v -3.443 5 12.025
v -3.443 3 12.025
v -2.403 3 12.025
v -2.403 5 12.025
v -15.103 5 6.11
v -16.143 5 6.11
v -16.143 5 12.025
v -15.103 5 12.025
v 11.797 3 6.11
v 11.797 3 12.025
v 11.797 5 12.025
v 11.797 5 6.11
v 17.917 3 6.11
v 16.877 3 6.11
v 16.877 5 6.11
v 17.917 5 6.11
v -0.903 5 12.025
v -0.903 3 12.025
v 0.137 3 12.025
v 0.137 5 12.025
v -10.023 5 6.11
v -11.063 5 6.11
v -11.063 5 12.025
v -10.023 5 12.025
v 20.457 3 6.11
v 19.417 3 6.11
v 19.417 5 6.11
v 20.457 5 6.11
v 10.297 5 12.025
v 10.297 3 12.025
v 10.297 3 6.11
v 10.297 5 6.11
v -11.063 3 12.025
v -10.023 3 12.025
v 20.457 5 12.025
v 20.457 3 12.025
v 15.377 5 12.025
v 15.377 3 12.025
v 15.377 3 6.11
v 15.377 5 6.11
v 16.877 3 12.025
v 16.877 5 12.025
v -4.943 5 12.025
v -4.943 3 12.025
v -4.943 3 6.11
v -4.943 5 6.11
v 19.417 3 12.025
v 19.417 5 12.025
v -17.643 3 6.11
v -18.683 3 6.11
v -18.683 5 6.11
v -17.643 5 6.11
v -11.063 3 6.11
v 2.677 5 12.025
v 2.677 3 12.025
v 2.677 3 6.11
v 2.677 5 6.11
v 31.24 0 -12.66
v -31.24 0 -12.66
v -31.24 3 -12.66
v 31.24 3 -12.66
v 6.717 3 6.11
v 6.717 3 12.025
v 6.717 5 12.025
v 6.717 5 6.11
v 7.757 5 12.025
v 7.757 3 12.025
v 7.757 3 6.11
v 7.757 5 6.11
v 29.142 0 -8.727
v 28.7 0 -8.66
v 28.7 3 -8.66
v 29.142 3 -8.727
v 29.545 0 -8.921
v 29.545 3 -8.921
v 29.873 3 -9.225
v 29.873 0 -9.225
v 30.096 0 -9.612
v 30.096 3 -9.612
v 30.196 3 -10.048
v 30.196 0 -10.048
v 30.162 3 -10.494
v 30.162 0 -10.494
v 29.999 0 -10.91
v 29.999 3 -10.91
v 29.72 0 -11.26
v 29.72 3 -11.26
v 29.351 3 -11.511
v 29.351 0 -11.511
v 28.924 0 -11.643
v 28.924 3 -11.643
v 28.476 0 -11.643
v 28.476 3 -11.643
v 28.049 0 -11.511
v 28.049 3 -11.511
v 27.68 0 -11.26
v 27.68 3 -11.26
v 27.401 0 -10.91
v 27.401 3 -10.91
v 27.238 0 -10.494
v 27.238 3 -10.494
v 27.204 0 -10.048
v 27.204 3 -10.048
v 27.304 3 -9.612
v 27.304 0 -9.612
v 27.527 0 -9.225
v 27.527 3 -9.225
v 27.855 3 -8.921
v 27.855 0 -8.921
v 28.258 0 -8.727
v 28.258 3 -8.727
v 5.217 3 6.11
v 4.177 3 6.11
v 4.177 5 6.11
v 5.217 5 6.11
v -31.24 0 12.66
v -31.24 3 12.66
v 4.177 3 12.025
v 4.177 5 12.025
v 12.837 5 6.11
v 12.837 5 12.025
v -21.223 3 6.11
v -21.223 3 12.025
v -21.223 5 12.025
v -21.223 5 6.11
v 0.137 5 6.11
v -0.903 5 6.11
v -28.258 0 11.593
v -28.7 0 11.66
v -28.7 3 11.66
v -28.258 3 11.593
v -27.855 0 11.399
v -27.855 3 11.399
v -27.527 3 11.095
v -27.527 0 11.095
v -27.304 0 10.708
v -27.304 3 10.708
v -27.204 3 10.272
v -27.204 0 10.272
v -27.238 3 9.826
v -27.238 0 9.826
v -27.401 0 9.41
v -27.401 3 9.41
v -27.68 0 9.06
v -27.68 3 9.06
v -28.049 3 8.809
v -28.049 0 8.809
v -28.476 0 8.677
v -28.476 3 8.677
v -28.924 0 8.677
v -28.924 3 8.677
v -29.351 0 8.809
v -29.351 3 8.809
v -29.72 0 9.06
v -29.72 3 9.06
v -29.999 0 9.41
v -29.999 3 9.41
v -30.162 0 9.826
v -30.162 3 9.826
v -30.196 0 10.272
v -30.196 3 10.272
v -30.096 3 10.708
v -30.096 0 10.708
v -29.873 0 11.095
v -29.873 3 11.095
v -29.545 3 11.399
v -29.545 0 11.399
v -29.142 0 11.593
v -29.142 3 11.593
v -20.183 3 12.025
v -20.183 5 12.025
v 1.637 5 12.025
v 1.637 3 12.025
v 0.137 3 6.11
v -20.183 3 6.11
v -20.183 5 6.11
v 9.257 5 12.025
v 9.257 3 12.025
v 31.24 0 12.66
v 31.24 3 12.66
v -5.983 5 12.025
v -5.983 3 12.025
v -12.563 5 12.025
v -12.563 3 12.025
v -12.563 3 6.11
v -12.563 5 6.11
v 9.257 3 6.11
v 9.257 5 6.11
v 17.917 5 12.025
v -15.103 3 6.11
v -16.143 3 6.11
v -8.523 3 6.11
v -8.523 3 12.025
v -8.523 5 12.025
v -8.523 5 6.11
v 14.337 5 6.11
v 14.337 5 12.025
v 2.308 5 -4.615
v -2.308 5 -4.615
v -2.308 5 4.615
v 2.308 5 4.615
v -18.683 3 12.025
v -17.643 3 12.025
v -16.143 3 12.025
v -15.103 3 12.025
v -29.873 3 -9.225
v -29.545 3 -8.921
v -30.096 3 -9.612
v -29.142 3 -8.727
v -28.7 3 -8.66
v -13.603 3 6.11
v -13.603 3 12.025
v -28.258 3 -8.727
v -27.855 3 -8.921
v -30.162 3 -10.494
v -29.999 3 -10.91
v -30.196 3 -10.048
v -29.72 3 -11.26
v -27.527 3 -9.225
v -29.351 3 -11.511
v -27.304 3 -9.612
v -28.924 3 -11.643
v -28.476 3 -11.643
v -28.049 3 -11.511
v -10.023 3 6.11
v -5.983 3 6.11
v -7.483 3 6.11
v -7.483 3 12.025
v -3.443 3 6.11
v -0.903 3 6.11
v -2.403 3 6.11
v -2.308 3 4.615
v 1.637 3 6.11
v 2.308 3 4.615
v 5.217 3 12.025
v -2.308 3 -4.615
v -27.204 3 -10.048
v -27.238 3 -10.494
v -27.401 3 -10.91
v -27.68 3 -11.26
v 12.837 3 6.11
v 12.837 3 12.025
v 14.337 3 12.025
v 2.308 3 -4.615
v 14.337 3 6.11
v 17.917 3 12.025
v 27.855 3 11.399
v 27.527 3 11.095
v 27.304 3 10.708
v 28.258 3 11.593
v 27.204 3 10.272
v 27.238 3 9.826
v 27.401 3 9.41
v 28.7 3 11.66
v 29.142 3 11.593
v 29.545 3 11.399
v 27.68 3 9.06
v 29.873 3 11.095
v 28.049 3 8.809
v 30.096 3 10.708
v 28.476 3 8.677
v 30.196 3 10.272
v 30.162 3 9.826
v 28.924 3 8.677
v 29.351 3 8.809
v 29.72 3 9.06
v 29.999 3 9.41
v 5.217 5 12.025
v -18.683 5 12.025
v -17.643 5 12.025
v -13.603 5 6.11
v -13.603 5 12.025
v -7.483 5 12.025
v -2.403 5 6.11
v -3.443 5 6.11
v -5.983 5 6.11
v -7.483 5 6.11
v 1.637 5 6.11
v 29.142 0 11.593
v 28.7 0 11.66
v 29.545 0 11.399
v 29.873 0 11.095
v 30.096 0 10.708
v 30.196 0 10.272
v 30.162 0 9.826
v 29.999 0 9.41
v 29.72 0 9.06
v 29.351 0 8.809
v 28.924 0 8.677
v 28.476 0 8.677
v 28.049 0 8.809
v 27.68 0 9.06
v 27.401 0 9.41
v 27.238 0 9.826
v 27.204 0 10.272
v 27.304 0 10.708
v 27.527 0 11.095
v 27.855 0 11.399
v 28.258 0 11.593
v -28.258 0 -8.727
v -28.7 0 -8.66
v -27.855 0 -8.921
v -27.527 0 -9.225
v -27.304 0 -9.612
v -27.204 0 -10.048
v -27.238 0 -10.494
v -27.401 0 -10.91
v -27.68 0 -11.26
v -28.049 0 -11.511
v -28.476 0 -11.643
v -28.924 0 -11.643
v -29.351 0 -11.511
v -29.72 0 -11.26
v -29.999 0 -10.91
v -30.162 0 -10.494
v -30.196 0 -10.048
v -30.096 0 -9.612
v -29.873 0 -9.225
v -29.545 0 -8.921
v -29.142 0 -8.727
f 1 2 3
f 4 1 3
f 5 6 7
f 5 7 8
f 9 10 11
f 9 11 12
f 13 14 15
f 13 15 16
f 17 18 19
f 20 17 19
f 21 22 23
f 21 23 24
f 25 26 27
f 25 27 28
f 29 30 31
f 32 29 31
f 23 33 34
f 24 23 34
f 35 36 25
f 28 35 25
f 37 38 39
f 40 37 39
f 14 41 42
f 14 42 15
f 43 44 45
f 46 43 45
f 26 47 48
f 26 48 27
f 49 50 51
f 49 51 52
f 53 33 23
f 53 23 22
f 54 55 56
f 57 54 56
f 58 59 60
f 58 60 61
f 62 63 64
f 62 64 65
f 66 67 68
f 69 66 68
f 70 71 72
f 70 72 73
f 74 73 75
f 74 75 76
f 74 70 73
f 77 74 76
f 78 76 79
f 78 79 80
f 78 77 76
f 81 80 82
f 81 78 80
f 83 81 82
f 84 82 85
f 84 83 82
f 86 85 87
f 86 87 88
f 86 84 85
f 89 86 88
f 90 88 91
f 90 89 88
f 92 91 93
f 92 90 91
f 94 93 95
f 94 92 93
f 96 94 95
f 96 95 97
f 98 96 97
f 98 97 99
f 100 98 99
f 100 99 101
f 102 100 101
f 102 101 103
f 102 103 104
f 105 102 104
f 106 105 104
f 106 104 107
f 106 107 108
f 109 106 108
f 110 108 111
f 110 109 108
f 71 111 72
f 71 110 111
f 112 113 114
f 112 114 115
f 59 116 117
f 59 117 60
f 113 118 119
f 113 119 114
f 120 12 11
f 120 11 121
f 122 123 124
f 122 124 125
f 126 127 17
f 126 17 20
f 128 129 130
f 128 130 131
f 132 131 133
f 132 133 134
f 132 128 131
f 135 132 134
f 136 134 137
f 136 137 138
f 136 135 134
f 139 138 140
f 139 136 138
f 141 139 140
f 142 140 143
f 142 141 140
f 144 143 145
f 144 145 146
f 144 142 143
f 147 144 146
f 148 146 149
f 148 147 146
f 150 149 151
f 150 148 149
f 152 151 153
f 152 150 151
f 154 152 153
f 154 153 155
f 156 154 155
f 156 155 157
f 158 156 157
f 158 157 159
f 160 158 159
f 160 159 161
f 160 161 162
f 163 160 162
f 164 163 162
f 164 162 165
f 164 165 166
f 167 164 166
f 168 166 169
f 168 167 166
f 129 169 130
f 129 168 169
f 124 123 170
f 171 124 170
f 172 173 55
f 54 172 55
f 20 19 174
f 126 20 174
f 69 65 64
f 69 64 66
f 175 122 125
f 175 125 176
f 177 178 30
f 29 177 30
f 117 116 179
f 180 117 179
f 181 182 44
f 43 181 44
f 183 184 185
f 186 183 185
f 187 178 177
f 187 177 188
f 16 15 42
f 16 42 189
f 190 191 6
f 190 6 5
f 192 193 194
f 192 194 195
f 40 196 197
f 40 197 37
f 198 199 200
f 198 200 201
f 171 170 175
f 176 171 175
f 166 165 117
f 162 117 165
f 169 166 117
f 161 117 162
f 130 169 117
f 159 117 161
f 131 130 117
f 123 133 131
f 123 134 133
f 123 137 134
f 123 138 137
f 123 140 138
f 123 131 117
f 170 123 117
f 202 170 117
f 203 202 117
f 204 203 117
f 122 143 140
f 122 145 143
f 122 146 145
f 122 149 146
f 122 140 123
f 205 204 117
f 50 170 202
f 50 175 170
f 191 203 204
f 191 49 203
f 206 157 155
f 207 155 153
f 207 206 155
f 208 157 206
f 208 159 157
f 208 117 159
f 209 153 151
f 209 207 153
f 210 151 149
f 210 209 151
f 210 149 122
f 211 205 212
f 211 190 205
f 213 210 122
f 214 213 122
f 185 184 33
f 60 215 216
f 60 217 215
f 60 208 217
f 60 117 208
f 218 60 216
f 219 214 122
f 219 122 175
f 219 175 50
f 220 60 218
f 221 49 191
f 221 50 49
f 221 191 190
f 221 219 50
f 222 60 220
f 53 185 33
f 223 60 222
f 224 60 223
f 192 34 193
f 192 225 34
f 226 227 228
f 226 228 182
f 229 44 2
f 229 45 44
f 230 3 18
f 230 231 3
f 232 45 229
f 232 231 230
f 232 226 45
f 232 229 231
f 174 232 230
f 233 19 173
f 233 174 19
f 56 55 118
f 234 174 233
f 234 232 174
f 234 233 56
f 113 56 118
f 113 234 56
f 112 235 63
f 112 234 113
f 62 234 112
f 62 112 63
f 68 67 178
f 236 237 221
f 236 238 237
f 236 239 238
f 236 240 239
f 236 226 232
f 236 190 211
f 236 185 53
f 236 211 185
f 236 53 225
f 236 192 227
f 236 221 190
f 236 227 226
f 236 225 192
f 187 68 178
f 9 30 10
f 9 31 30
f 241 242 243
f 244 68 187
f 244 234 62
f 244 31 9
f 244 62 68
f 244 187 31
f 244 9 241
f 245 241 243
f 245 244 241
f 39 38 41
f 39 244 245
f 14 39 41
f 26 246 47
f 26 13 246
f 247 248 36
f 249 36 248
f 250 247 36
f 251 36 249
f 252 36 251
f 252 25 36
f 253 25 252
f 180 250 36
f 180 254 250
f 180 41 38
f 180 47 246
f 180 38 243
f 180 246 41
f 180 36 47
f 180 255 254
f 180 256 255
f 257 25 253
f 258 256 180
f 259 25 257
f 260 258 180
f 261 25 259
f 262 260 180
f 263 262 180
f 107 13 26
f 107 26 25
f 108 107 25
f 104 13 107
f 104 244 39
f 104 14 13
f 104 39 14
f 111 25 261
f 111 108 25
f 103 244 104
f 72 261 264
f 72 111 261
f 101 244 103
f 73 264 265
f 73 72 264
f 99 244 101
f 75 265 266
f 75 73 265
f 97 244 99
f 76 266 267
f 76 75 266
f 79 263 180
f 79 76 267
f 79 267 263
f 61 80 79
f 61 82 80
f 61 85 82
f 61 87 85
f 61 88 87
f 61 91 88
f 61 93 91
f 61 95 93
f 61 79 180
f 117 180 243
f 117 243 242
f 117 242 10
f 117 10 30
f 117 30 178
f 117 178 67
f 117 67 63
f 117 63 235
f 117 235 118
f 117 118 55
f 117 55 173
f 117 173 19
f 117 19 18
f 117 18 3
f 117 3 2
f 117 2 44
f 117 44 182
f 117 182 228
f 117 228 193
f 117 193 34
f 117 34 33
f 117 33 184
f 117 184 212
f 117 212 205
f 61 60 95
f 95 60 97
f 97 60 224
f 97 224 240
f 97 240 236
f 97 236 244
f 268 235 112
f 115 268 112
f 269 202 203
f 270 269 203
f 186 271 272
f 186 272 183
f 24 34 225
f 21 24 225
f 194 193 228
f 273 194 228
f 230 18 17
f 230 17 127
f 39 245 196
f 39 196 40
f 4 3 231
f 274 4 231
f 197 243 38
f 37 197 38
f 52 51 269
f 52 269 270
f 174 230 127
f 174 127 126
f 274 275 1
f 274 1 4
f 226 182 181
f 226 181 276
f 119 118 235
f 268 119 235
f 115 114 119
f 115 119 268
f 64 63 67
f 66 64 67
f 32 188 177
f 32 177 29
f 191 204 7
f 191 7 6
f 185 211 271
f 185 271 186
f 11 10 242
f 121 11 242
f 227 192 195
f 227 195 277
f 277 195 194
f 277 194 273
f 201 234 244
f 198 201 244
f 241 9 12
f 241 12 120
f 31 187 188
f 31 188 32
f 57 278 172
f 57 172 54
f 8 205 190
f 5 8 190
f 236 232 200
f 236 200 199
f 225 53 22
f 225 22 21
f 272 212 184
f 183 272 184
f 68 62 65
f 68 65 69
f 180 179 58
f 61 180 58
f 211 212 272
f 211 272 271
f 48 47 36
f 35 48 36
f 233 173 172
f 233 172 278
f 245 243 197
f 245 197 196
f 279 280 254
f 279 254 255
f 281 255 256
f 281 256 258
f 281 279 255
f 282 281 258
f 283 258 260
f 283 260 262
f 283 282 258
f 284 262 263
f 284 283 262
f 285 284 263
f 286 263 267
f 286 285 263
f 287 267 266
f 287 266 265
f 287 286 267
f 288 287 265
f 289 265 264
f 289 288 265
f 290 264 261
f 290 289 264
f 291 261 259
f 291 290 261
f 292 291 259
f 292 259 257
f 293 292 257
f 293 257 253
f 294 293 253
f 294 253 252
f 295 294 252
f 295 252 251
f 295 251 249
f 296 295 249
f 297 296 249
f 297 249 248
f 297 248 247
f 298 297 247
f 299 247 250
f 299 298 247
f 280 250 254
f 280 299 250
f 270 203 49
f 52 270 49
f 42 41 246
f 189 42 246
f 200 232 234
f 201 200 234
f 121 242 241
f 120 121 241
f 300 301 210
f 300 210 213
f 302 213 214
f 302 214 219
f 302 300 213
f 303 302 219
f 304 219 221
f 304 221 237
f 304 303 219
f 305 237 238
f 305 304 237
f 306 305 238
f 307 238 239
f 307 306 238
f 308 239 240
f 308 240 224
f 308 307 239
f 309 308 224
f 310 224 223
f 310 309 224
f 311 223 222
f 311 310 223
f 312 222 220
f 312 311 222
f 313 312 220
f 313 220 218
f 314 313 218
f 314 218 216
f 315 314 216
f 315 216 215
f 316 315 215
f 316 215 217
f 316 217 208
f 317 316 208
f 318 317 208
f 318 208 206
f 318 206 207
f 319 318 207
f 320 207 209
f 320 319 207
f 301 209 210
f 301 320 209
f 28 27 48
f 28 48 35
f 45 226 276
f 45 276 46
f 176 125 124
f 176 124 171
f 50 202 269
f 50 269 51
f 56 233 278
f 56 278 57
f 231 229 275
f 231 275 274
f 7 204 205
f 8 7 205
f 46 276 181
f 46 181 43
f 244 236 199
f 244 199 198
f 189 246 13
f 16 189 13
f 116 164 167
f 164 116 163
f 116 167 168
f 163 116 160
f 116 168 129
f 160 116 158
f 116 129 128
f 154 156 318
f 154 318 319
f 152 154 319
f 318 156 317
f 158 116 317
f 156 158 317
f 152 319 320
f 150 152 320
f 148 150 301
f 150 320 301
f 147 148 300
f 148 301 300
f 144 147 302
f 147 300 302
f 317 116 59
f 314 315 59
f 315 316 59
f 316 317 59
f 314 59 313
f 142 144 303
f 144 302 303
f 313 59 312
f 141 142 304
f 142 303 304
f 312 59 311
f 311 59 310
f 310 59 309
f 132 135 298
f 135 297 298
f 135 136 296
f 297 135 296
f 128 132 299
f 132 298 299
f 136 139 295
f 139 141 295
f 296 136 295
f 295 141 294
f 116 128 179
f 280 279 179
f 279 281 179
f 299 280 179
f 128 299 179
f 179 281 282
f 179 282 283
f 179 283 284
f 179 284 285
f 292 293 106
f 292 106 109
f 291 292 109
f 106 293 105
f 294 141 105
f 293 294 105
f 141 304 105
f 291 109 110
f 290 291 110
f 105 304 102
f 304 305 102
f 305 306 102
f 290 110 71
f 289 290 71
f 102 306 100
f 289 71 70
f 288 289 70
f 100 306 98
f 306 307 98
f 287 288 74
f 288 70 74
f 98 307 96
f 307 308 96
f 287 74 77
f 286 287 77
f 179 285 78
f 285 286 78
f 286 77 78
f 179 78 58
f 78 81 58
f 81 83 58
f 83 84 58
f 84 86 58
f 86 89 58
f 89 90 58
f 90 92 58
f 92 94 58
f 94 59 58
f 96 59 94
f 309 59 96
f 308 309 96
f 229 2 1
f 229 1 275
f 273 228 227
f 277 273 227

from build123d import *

# Parameters (mm, degrees)
SKETCH1_W           = 62.48
SKETCH1_H           = 25.32
SKETCH1_R           = 1.5
BOSS_EXTRUDE1_DEPTH = 3
SKETCH2_W           = 1.040030553
SKETCH2_H           = 5.915173771
SKETCH2_W_2         = 4.61513558
SKETCH2_H_2         = 9.230271158
BOSS_EXTRUDE2_DEPTH = 2


with BuildPart() as part:
    # Sketch1 → Boss-Extrude1 (new body)
    with BuildSketch(Plane(origin=(0, 0, 0), x_dir=(1, 0, 0), z_dir=(0, 1, 0))):
        Rectangle(SKETCH1_W, SKETCH1_H)
        with Locations(Location((28.7, 10.16, 0), (0, 0, 270))):
            Circle(SKETCH1_R, mode=Mode.SUBTRACT)
        with Locations(Location((28.7, -10.16, 0), (0, 0, 270))):
            Circle(SKETCH1_R, mode=Mode.SUBTRACT)
        with Locations(Location((-28.7, 10.16, 0), (0, 0, 270))):
            Circle(SKETCH1_R, mode=Mode.SUBTRACT)
        with Locations(Location((-28.7, -10.16, 0), (0, 0, 270))):
            Circle(SKETCH1_R, mode=Mode.SUBTRACT)
    extrude(amount=BOSS_EXTRUDE1_DEPTH)

    # Sketch2 → Boss-Extrude2 (add)
    with BuildSketch(Plane(origin=(0, 3, 0), x_dir=(1, 0, 0), z_dir=(0, 1, 0))):
        with Locations((-18.163108198, -9.067766385)):
            Rectangle(SKETCH2_W, SKETCH2_H)
        Rectangle(SKETCH2_W_2, SKETCH2_H_2)
        with Locations((-20.703108198, -9.067766385)):
            Rectangle(SKETCH2_W, SKETCH2_H)
        with Locations((-15.623108198, -9.067766385)):
            Rectangle(SKETCH2_W, SKETCH2_H)
        with Locations((-13.083108197, -9.067766385)):
            Rectangle(SKETCH2_W, SKETCH2_H)
        with Locations((-10.543108198, -9.067766385)):
            Rectangle(SKETCH2_W, SKETCH2_H)
        with Locations((-8.003108198, -9.067766385)):
            Rectangle(SKETCH2_W, SKETCH2_H)
        with Locations((-5.463108198, -9.067766385)):
            Rectangle(SKETCH2_W, SKETCH2_H)
        with Locations((-2.923108198, -9.067766385)):
            Rectangle(SKETCH2_W, SKETCH2_H)
        with Locations((-0.383108198, -9.067766385)):
            Rectangle(SKETCH2_W, SKETCH2_H)
        with Locations((2.156891803, -9.067766385)):
            Rectangle(SKETCH2_W, SKETCH2_H)
        with Locations((4.696891802, -9.067766385)):
            Rectangle(SKETCH2_W, SKETCH2_H)
        with Locations((7.236891803, -9.067766385)):
            Rectangle(SKETCH2_W, SKETCH2_H)
        with Locations((9.776891802, -9.067766385)):
            Rectangle(SKETCH2_W, SKETCH2_H)
        with Locations((12.316891803, -9.067766385)):
            Rectangle(SKETCH2_W, SKETCH2_H)
        with Locations((14.856891803, -9.067766385)):
            Rectangle(SKETCH2_W, SKETCH2_H)
        with Locations((17.396891803, -9.067766385)):
            Rectangle(SKETCH2_W, SKETCH2_H)
        with Locations((19.936891802, -9.067766385)):
            Rectangle(SKETCH2_W, SKETCH2_H)
    extrude(amount=BOSS_EXTRUDE2_DEPTH)


solid = part.part
